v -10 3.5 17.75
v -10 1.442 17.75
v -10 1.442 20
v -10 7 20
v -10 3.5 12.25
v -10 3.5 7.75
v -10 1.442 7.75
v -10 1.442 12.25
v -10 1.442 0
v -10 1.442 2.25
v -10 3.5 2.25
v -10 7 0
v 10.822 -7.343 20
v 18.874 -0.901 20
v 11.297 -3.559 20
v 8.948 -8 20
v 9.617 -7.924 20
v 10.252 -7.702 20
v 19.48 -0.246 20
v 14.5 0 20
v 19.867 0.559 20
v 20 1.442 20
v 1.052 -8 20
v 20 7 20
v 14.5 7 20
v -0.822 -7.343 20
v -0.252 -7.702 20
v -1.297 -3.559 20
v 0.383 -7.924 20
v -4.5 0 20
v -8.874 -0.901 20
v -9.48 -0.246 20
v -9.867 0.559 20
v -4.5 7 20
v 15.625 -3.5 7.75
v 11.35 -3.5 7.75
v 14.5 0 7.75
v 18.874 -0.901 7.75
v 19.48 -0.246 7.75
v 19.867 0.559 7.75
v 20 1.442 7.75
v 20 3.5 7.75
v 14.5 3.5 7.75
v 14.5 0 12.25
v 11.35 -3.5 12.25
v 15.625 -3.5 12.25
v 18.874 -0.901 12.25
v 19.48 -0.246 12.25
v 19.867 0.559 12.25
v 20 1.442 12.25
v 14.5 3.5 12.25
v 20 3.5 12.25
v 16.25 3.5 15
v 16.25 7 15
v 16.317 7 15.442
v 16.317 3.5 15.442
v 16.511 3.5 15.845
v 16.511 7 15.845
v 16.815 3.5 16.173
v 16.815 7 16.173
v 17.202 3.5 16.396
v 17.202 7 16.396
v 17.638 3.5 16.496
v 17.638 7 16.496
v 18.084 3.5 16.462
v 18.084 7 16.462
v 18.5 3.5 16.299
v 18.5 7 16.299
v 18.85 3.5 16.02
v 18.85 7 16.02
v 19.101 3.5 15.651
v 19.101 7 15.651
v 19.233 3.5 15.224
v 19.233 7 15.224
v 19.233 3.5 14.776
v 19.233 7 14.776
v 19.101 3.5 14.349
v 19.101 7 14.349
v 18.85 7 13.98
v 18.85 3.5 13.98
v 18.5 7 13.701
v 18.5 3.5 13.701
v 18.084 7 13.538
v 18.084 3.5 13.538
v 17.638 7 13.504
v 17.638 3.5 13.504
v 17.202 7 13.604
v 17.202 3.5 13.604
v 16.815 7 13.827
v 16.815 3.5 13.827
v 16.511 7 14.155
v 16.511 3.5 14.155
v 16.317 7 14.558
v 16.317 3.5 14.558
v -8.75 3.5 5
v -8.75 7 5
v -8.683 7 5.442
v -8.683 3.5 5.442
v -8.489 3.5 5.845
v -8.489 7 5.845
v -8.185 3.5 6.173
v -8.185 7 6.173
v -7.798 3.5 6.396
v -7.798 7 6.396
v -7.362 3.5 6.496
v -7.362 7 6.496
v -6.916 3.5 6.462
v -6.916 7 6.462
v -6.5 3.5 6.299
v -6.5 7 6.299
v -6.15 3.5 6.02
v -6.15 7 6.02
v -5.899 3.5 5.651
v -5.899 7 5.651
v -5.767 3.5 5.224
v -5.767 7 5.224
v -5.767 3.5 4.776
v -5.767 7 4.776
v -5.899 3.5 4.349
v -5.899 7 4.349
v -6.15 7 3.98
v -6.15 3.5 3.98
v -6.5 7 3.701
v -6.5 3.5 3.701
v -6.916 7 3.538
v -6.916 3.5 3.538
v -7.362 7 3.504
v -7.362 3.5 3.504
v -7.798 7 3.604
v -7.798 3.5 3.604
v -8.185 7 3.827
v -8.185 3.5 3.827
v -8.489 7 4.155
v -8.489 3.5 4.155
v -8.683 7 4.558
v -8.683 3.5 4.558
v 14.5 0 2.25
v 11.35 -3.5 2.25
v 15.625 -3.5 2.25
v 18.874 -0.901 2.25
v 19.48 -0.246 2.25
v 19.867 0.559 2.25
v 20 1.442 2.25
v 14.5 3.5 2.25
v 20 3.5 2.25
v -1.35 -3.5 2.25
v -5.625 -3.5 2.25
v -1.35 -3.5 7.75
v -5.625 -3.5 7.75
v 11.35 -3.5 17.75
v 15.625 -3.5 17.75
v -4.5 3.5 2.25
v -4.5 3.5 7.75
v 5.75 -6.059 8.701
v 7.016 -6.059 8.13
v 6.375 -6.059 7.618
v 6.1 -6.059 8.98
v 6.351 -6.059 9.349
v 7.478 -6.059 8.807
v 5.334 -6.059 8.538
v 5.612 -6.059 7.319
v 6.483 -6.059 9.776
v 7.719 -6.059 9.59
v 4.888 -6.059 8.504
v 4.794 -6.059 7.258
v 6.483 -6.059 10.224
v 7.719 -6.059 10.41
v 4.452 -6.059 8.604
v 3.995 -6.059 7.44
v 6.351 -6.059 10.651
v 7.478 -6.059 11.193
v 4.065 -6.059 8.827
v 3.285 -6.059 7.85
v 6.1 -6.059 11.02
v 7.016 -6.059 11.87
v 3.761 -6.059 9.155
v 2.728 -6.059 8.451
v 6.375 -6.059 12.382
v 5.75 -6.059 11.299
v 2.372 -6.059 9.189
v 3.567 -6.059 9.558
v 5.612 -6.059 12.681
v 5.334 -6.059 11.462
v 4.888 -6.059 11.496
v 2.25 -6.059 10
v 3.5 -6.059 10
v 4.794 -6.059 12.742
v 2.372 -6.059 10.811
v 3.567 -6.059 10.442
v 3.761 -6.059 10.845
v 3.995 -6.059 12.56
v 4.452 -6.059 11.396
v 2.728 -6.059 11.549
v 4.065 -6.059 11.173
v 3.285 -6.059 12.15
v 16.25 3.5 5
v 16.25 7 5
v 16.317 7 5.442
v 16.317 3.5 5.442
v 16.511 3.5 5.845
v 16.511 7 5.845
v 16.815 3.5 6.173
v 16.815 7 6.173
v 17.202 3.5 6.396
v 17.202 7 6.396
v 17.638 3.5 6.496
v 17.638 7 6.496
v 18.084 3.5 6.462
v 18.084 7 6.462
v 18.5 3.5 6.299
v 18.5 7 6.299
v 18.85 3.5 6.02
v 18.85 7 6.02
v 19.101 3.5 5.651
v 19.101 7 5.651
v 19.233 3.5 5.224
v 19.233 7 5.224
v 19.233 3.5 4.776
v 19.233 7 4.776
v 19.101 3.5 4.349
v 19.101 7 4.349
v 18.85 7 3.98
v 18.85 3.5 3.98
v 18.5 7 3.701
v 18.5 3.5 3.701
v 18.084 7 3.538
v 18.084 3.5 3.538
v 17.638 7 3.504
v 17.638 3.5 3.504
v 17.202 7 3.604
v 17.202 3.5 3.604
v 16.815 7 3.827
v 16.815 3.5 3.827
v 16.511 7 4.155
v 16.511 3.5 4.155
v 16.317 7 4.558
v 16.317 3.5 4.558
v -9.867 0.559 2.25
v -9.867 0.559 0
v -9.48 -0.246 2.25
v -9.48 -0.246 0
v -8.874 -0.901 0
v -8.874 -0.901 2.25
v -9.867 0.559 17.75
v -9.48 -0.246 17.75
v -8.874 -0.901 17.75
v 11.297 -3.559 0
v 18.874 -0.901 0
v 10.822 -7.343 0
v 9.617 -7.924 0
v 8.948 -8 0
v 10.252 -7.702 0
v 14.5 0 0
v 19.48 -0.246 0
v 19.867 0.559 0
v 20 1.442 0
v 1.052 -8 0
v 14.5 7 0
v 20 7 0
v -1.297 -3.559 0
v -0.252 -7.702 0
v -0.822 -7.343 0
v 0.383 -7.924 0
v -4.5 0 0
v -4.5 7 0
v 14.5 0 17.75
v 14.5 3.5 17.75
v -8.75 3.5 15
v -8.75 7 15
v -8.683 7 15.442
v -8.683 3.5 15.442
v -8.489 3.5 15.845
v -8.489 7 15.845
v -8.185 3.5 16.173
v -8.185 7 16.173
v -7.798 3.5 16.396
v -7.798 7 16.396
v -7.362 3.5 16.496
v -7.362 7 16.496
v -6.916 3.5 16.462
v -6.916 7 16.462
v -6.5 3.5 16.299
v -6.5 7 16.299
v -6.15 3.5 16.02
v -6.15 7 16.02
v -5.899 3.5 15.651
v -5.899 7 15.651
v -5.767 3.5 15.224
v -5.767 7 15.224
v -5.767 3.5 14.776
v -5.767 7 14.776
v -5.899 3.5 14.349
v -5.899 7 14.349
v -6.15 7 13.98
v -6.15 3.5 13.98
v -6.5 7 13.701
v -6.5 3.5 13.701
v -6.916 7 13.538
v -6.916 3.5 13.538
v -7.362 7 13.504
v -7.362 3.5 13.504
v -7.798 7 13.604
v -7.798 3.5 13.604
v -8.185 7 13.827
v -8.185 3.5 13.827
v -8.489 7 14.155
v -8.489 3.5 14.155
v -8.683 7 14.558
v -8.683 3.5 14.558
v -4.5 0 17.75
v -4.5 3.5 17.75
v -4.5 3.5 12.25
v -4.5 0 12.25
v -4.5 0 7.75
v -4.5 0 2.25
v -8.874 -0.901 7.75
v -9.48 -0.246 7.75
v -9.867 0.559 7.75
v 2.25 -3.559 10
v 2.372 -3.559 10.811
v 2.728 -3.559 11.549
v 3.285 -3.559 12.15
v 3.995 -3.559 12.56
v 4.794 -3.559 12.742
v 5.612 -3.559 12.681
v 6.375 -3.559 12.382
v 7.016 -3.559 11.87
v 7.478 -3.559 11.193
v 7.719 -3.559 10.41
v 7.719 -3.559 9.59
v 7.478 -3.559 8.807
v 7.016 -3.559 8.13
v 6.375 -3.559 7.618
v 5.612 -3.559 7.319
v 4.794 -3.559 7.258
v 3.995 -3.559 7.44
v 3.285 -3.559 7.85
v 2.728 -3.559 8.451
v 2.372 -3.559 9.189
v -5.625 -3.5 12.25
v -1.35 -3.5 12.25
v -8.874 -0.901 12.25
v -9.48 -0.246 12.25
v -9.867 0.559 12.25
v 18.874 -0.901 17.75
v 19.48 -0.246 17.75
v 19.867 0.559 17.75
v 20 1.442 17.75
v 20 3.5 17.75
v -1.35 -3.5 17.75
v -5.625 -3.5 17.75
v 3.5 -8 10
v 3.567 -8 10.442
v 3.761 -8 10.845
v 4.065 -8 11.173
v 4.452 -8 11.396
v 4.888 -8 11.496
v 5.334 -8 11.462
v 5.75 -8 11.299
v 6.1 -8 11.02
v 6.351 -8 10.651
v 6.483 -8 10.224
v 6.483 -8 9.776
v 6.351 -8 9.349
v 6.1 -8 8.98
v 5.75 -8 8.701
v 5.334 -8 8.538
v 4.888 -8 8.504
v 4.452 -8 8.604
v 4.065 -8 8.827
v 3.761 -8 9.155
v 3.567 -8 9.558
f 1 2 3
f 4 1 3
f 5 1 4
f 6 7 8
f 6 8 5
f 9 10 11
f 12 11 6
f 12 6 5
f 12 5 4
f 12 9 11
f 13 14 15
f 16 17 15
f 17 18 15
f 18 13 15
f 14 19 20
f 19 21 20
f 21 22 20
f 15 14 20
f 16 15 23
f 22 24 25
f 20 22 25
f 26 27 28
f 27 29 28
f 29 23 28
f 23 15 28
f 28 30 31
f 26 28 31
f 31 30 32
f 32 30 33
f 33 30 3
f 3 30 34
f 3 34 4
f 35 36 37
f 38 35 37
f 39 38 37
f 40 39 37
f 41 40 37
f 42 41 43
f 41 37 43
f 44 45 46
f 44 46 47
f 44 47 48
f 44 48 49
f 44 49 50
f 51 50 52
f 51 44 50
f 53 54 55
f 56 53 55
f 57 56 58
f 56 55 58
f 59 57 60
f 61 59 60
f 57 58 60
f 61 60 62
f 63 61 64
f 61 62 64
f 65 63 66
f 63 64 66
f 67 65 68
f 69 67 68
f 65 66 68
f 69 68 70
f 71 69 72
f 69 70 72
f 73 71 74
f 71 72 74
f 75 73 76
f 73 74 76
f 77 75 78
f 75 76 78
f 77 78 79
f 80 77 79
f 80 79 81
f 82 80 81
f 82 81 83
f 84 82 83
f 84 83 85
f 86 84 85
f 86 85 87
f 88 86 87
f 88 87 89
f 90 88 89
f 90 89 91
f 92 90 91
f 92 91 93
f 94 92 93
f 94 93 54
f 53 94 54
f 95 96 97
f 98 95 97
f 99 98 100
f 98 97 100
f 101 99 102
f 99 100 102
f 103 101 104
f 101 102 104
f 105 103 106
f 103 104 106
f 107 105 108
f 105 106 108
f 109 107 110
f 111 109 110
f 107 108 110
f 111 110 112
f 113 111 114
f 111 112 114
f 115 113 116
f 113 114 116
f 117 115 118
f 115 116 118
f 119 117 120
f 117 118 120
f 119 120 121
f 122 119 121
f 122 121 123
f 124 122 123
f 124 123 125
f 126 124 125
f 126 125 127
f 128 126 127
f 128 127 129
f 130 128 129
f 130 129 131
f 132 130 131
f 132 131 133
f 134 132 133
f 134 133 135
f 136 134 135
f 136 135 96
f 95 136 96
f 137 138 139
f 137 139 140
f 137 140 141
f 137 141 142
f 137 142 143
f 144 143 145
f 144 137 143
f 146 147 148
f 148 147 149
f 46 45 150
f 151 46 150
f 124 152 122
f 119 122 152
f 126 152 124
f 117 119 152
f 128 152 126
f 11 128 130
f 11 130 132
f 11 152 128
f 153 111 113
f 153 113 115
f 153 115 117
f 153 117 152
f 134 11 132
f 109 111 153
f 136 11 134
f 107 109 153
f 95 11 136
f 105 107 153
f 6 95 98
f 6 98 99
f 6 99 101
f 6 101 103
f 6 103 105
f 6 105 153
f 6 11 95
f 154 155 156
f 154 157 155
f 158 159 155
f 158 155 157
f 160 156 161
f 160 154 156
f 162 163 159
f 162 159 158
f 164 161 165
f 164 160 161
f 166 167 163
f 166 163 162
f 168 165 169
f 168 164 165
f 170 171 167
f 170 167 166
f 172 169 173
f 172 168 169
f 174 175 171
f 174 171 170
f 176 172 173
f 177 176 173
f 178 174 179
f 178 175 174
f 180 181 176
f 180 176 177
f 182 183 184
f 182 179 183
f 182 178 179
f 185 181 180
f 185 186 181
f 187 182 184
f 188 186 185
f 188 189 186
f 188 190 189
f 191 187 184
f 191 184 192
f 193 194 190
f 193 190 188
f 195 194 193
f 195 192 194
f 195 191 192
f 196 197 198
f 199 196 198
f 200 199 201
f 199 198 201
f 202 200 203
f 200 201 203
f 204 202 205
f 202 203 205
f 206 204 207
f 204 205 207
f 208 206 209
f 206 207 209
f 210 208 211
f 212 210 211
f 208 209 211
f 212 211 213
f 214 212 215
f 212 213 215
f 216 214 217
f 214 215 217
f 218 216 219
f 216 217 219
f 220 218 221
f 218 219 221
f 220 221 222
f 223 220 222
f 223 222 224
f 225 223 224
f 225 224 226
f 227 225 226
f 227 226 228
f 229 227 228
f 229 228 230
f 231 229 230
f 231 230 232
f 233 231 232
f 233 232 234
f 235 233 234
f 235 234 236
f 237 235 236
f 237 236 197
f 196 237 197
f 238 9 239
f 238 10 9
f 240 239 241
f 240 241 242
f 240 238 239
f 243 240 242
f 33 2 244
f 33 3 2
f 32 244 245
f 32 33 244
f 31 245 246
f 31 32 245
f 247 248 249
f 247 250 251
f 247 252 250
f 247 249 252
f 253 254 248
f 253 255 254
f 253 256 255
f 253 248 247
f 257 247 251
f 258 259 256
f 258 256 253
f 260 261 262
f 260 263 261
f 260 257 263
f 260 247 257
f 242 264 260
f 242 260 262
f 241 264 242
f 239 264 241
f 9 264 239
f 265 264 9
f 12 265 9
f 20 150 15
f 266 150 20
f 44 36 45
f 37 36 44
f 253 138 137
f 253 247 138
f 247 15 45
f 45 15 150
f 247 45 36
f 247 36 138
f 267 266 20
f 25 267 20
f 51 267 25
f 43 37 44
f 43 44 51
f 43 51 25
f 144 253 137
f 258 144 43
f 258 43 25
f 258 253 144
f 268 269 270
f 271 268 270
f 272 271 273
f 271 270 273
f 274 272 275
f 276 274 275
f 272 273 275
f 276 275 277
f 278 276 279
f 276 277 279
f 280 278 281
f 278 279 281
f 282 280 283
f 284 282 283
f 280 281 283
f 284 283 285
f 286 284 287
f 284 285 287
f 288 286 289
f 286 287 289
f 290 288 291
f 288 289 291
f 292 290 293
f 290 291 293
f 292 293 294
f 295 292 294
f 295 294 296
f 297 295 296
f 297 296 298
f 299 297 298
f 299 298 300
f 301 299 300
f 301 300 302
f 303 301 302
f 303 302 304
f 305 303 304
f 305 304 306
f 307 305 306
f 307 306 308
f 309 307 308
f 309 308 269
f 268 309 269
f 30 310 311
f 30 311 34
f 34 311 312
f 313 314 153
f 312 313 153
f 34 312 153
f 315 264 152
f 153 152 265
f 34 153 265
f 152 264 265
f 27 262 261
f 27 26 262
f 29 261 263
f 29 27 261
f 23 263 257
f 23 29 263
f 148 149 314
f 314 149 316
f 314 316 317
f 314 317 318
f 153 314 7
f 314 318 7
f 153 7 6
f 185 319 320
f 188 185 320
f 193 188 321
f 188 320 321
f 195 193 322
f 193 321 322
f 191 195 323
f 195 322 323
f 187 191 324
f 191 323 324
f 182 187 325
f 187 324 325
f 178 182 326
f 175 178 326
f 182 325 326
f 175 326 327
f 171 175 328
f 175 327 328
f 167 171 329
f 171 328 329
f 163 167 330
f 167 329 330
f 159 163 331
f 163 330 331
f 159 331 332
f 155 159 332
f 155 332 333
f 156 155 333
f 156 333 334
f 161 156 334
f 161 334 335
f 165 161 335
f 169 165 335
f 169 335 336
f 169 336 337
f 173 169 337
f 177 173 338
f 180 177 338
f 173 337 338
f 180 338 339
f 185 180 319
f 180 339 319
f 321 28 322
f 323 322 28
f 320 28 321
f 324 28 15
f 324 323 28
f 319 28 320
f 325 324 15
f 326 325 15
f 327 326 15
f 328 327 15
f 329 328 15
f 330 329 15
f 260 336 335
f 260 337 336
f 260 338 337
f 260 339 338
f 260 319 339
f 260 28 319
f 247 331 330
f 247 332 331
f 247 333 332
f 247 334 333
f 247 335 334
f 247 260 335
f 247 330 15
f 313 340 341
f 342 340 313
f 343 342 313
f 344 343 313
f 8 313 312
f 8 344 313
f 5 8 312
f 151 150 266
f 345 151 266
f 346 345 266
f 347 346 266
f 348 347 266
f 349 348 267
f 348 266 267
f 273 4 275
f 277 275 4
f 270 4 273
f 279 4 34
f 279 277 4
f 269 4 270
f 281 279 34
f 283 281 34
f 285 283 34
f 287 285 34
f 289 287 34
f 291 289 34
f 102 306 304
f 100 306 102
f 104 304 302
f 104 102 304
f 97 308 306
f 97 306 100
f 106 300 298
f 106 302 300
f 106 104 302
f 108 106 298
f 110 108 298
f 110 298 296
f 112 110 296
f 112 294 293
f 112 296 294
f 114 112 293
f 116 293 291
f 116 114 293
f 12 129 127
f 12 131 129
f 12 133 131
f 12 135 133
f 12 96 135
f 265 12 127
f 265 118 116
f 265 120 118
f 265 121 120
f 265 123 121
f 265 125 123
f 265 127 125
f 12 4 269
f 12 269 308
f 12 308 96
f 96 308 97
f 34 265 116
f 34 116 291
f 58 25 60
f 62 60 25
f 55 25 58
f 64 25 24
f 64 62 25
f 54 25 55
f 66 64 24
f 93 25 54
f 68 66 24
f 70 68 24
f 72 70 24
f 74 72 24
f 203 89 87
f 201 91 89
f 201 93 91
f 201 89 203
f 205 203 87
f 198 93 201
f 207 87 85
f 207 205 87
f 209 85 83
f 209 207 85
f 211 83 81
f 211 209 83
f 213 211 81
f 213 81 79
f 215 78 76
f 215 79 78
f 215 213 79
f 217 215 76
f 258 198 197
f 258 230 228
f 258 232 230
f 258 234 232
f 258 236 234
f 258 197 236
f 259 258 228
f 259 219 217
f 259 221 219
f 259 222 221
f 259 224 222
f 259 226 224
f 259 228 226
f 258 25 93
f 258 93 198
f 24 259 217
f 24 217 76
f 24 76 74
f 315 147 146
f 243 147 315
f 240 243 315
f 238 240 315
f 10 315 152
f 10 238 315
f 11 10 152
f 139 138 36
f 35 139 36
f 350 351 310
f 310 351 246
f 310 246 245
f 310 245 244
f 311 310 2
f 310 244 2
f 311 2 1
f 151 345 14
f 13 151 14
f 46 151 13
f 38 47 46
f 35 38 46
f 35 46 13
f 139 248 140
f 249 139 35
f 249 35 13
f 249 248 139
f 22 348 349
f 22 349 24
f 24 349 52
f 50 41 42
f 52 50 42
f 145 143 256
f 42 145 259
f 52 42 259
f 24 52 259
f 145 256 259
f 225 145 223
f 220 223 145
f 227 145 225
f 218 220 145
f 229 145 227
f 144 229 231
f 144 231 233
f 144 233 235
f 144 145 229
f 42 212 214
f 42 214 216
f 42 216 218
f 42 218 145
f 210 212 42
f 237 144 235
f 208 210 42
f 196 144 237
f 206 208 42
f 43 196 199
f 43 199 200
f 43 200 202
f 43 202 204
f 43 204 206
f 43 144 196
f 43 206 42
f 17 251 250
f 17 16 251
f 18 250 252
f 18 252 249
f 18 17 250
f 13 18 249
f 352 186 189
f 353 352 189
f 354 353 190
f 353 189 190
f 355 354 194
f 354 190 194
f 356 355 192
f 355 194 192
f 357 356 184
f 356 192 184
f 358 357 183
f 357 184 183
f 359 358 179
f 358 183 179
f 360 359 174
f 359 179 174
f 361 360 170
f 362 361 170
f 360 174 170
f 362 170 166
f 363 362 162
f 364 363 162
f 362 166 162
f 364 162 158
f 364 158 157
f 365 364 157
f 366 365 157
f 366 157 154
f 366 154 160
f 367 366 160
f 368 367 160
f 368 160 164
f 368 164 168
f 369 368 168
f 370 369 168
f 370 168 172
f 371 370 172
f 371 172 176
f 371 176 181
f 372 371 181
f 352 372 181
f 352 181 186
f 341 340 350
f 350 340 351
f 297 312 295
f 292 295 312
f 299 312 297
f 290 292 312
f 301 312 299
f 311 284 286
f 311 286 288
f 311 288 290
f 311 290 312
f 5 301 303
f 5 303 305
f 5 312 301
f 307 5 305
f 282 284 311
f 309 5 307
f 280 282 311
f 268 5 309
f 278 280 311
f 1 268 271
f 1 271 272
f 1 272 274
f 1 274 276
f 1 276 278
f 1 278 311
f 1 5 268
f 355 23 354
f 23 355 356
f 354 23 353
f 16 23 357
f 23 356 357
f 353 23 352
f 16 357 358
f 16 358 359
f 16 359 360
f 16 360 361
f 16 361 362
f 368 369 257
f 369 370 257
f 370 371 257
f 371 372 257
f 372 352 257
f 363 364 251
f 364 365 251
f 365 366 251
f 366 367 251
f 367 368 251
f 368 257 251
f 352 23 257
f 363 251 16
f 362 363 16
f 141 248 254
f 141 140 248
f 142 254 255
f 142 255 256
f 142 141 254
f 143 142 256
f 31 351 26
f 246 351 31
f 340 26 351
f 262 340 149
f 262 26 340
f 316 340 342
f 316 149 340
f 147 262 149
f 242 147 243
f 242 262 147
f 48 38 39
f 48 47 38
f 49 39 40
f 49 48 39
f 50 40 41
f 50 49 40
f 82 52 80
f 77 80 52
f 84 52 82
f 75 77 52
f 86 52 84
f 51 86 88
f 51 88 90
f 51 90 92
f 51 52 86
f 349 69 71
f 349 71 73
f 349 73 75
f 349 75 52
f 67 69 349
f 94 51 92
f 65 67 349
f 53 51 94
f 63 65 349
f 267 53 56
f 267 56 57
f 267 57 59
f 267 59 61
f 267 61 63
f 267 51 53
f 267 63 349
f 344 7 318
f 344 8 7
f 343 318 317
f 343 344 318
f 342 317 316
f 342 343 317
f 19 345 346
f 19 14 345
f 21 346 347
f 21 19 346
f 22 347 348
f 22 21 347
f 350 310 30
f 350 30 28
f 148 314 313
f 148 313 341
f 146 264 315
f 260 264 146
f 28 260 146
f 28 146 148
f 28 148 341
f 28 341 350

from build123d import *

# Parameters (mm, degrees)
CROQUIS1_W              = 5.5
CROQUIS1_H              = 7
CROQUIS1_W_2            = 5
CROQUIS1_H_2            = 3
SALIENTE_EXTRUIR1_DEPTH = 20
CROQUIS2_W              = 5.5
CROQUIS2_H              = 7
CORTAR_EXTRUIR3_DEPTH   = 37.932370625
CROQUIS3_R              = 1.5
CORTAR_EXTRUIR4_DEPTH   = 33.015621187
REDONDEO1_R             = 3
CROQUIS4_R              = 1.5
CORTAR_EXTRUIR5_DEPTH   = 31.724582991
SALIENTE_EXTRUIR2_DEPTH = 20
CROQUIS9_R              = 2.75
CORTAR_EXTRUIR6_DEPTH   = 2.5


with BuildPart() as part:
    # Croquis1 → Saliente-Extruir1 (new body)
    with BuildSketch(Plane.XY):
        with Locations((-7.25, 3.5)):
            Rectangle(CROQUIS1_W, CROQUIS1_H)
        Polygon((0, -5), (0, -8), (-10, 0), (-4.5, 0), align=None)
        with Locations((2.5, -6.5)):
            Rectangle(CROQUIS1_W_2, CROQUIS1_H_2)
        with Locations((7.5, -6.5)):
            Rectangle(CROQUIS1_W_2, CROQUIS1_H_2)
        Polygon((14.5, 0), (20, 0), (10, -8), (10, -5), align=None)
        with Locations((17.25, 3.5)):
            Rectangle(CROQUIS1_W, CROQUIS1_H)
    extrude(amount=SALIENTE_EXTRUIR1_DEPTH)

    # Croquis2 → Cortar-Extruir3 (cut, through all)
    with BuildSketch(Plane.ZY.offset(10)):
        with Locations((15, 0)):
            Rectangle(CROQUIS2_W, CROQUIS2_H)
        with Locations((5, 0)):
            Rectangle(CROQUIS2_W, CROQUIS2_H)
    extrude(amount=-CORTAR_EXTRUIR3_DEPTH, mode=Mode.SUBTRACT)

    # Croquis3 → Cortar-Extruir4 (cut, through all)
    with BuildSketch(Plane(origin=(0, 7, 0), x_dir=(1, 0, 0), z_dir=(0, 1, 0))):
        with Locations(Location((-7.25, -5, 0), (0, 0, 180))):
            Circle(CROQUIS3_R)
        with Locations(Location((17.75, -5, 0), (0, 0, 180))):
            Circle(CROQUIS3_R)
        with Locations(Location((17.75, -15, 0), (0, 0, 180))):
            Circle(CROQUIS3_R)
        with Locations(Location((-7.25, -15, 0), (0, 0, 180))):
            Circle(CROQUIS3_R)
    extrude(amount=-CORTAR_EXTRUIR4_DEPTH, mode=Mode.SUBTRACT)

    # Redondeo1
    redondeo1_edges = [part.edges().sort_by_distance(p)[0] for p in [
        (20, 0, 18.875),
        (10, -8, 10),
        (0, -8, 10),
        (-10, 0, 18.875),
        (20, 0, 10),
        (20, 0, 1.125),
        (-10, 0, 10),
        (-10, 0, 1.125),
    ]]
    fillet(redondeo1_edges, radius=REDONDEO1_R)

    # Croquis4 → Cortar-Extruir5 (cut, through all)
    with BuildSketch(Plane(origin=(0, -5, 0), x_dir=(1, 0, 0), z_dir=(0, 1, 0))):
        with Locations(Location((5, -10, 0), (0, 0, 180))):
            Circle(CROQUIS4_R)
    extrude(amount=-CORTAR_EXTRUIR5_DEPTH, mode=Mode.SUBTRACT)

    # Croquis8 → Saliente-Extruir2 (add, through all)
    with BuildSketch(Plane(origin=(0, 0, 0), x_dir=(-1, 0, 0), z_dir=(0, 0, -1))):
        Polygon((-5, -5), (0, -5), (1.29685781, -3.559046878), (-5, -3.559046878), align=None)
        Polygon((-10, -5), (-5, -5), (-5, -3.559046878), (-11.29685781, -3.559046878), align=None)
    extrude(amount=-SALIENTE_EXTRUIR2_DEPTH)

    # Croquis9 → Cortar-Extruir6 (cut)
    with BuildSketch(Plane(origin=(0, -3.559046878, 0), x_dir=(1, 0, 0), z_dir=(0, 1, 0))):
        with Locations(Location((5, -10, 0), (0, 0, 180))):
            Circle(CROQUIS9_R)
    extrude(amount=-CORTAR_EXTRUIR6_DEPTH, mode=Mode.SUBTRACT)


solid = part.part
